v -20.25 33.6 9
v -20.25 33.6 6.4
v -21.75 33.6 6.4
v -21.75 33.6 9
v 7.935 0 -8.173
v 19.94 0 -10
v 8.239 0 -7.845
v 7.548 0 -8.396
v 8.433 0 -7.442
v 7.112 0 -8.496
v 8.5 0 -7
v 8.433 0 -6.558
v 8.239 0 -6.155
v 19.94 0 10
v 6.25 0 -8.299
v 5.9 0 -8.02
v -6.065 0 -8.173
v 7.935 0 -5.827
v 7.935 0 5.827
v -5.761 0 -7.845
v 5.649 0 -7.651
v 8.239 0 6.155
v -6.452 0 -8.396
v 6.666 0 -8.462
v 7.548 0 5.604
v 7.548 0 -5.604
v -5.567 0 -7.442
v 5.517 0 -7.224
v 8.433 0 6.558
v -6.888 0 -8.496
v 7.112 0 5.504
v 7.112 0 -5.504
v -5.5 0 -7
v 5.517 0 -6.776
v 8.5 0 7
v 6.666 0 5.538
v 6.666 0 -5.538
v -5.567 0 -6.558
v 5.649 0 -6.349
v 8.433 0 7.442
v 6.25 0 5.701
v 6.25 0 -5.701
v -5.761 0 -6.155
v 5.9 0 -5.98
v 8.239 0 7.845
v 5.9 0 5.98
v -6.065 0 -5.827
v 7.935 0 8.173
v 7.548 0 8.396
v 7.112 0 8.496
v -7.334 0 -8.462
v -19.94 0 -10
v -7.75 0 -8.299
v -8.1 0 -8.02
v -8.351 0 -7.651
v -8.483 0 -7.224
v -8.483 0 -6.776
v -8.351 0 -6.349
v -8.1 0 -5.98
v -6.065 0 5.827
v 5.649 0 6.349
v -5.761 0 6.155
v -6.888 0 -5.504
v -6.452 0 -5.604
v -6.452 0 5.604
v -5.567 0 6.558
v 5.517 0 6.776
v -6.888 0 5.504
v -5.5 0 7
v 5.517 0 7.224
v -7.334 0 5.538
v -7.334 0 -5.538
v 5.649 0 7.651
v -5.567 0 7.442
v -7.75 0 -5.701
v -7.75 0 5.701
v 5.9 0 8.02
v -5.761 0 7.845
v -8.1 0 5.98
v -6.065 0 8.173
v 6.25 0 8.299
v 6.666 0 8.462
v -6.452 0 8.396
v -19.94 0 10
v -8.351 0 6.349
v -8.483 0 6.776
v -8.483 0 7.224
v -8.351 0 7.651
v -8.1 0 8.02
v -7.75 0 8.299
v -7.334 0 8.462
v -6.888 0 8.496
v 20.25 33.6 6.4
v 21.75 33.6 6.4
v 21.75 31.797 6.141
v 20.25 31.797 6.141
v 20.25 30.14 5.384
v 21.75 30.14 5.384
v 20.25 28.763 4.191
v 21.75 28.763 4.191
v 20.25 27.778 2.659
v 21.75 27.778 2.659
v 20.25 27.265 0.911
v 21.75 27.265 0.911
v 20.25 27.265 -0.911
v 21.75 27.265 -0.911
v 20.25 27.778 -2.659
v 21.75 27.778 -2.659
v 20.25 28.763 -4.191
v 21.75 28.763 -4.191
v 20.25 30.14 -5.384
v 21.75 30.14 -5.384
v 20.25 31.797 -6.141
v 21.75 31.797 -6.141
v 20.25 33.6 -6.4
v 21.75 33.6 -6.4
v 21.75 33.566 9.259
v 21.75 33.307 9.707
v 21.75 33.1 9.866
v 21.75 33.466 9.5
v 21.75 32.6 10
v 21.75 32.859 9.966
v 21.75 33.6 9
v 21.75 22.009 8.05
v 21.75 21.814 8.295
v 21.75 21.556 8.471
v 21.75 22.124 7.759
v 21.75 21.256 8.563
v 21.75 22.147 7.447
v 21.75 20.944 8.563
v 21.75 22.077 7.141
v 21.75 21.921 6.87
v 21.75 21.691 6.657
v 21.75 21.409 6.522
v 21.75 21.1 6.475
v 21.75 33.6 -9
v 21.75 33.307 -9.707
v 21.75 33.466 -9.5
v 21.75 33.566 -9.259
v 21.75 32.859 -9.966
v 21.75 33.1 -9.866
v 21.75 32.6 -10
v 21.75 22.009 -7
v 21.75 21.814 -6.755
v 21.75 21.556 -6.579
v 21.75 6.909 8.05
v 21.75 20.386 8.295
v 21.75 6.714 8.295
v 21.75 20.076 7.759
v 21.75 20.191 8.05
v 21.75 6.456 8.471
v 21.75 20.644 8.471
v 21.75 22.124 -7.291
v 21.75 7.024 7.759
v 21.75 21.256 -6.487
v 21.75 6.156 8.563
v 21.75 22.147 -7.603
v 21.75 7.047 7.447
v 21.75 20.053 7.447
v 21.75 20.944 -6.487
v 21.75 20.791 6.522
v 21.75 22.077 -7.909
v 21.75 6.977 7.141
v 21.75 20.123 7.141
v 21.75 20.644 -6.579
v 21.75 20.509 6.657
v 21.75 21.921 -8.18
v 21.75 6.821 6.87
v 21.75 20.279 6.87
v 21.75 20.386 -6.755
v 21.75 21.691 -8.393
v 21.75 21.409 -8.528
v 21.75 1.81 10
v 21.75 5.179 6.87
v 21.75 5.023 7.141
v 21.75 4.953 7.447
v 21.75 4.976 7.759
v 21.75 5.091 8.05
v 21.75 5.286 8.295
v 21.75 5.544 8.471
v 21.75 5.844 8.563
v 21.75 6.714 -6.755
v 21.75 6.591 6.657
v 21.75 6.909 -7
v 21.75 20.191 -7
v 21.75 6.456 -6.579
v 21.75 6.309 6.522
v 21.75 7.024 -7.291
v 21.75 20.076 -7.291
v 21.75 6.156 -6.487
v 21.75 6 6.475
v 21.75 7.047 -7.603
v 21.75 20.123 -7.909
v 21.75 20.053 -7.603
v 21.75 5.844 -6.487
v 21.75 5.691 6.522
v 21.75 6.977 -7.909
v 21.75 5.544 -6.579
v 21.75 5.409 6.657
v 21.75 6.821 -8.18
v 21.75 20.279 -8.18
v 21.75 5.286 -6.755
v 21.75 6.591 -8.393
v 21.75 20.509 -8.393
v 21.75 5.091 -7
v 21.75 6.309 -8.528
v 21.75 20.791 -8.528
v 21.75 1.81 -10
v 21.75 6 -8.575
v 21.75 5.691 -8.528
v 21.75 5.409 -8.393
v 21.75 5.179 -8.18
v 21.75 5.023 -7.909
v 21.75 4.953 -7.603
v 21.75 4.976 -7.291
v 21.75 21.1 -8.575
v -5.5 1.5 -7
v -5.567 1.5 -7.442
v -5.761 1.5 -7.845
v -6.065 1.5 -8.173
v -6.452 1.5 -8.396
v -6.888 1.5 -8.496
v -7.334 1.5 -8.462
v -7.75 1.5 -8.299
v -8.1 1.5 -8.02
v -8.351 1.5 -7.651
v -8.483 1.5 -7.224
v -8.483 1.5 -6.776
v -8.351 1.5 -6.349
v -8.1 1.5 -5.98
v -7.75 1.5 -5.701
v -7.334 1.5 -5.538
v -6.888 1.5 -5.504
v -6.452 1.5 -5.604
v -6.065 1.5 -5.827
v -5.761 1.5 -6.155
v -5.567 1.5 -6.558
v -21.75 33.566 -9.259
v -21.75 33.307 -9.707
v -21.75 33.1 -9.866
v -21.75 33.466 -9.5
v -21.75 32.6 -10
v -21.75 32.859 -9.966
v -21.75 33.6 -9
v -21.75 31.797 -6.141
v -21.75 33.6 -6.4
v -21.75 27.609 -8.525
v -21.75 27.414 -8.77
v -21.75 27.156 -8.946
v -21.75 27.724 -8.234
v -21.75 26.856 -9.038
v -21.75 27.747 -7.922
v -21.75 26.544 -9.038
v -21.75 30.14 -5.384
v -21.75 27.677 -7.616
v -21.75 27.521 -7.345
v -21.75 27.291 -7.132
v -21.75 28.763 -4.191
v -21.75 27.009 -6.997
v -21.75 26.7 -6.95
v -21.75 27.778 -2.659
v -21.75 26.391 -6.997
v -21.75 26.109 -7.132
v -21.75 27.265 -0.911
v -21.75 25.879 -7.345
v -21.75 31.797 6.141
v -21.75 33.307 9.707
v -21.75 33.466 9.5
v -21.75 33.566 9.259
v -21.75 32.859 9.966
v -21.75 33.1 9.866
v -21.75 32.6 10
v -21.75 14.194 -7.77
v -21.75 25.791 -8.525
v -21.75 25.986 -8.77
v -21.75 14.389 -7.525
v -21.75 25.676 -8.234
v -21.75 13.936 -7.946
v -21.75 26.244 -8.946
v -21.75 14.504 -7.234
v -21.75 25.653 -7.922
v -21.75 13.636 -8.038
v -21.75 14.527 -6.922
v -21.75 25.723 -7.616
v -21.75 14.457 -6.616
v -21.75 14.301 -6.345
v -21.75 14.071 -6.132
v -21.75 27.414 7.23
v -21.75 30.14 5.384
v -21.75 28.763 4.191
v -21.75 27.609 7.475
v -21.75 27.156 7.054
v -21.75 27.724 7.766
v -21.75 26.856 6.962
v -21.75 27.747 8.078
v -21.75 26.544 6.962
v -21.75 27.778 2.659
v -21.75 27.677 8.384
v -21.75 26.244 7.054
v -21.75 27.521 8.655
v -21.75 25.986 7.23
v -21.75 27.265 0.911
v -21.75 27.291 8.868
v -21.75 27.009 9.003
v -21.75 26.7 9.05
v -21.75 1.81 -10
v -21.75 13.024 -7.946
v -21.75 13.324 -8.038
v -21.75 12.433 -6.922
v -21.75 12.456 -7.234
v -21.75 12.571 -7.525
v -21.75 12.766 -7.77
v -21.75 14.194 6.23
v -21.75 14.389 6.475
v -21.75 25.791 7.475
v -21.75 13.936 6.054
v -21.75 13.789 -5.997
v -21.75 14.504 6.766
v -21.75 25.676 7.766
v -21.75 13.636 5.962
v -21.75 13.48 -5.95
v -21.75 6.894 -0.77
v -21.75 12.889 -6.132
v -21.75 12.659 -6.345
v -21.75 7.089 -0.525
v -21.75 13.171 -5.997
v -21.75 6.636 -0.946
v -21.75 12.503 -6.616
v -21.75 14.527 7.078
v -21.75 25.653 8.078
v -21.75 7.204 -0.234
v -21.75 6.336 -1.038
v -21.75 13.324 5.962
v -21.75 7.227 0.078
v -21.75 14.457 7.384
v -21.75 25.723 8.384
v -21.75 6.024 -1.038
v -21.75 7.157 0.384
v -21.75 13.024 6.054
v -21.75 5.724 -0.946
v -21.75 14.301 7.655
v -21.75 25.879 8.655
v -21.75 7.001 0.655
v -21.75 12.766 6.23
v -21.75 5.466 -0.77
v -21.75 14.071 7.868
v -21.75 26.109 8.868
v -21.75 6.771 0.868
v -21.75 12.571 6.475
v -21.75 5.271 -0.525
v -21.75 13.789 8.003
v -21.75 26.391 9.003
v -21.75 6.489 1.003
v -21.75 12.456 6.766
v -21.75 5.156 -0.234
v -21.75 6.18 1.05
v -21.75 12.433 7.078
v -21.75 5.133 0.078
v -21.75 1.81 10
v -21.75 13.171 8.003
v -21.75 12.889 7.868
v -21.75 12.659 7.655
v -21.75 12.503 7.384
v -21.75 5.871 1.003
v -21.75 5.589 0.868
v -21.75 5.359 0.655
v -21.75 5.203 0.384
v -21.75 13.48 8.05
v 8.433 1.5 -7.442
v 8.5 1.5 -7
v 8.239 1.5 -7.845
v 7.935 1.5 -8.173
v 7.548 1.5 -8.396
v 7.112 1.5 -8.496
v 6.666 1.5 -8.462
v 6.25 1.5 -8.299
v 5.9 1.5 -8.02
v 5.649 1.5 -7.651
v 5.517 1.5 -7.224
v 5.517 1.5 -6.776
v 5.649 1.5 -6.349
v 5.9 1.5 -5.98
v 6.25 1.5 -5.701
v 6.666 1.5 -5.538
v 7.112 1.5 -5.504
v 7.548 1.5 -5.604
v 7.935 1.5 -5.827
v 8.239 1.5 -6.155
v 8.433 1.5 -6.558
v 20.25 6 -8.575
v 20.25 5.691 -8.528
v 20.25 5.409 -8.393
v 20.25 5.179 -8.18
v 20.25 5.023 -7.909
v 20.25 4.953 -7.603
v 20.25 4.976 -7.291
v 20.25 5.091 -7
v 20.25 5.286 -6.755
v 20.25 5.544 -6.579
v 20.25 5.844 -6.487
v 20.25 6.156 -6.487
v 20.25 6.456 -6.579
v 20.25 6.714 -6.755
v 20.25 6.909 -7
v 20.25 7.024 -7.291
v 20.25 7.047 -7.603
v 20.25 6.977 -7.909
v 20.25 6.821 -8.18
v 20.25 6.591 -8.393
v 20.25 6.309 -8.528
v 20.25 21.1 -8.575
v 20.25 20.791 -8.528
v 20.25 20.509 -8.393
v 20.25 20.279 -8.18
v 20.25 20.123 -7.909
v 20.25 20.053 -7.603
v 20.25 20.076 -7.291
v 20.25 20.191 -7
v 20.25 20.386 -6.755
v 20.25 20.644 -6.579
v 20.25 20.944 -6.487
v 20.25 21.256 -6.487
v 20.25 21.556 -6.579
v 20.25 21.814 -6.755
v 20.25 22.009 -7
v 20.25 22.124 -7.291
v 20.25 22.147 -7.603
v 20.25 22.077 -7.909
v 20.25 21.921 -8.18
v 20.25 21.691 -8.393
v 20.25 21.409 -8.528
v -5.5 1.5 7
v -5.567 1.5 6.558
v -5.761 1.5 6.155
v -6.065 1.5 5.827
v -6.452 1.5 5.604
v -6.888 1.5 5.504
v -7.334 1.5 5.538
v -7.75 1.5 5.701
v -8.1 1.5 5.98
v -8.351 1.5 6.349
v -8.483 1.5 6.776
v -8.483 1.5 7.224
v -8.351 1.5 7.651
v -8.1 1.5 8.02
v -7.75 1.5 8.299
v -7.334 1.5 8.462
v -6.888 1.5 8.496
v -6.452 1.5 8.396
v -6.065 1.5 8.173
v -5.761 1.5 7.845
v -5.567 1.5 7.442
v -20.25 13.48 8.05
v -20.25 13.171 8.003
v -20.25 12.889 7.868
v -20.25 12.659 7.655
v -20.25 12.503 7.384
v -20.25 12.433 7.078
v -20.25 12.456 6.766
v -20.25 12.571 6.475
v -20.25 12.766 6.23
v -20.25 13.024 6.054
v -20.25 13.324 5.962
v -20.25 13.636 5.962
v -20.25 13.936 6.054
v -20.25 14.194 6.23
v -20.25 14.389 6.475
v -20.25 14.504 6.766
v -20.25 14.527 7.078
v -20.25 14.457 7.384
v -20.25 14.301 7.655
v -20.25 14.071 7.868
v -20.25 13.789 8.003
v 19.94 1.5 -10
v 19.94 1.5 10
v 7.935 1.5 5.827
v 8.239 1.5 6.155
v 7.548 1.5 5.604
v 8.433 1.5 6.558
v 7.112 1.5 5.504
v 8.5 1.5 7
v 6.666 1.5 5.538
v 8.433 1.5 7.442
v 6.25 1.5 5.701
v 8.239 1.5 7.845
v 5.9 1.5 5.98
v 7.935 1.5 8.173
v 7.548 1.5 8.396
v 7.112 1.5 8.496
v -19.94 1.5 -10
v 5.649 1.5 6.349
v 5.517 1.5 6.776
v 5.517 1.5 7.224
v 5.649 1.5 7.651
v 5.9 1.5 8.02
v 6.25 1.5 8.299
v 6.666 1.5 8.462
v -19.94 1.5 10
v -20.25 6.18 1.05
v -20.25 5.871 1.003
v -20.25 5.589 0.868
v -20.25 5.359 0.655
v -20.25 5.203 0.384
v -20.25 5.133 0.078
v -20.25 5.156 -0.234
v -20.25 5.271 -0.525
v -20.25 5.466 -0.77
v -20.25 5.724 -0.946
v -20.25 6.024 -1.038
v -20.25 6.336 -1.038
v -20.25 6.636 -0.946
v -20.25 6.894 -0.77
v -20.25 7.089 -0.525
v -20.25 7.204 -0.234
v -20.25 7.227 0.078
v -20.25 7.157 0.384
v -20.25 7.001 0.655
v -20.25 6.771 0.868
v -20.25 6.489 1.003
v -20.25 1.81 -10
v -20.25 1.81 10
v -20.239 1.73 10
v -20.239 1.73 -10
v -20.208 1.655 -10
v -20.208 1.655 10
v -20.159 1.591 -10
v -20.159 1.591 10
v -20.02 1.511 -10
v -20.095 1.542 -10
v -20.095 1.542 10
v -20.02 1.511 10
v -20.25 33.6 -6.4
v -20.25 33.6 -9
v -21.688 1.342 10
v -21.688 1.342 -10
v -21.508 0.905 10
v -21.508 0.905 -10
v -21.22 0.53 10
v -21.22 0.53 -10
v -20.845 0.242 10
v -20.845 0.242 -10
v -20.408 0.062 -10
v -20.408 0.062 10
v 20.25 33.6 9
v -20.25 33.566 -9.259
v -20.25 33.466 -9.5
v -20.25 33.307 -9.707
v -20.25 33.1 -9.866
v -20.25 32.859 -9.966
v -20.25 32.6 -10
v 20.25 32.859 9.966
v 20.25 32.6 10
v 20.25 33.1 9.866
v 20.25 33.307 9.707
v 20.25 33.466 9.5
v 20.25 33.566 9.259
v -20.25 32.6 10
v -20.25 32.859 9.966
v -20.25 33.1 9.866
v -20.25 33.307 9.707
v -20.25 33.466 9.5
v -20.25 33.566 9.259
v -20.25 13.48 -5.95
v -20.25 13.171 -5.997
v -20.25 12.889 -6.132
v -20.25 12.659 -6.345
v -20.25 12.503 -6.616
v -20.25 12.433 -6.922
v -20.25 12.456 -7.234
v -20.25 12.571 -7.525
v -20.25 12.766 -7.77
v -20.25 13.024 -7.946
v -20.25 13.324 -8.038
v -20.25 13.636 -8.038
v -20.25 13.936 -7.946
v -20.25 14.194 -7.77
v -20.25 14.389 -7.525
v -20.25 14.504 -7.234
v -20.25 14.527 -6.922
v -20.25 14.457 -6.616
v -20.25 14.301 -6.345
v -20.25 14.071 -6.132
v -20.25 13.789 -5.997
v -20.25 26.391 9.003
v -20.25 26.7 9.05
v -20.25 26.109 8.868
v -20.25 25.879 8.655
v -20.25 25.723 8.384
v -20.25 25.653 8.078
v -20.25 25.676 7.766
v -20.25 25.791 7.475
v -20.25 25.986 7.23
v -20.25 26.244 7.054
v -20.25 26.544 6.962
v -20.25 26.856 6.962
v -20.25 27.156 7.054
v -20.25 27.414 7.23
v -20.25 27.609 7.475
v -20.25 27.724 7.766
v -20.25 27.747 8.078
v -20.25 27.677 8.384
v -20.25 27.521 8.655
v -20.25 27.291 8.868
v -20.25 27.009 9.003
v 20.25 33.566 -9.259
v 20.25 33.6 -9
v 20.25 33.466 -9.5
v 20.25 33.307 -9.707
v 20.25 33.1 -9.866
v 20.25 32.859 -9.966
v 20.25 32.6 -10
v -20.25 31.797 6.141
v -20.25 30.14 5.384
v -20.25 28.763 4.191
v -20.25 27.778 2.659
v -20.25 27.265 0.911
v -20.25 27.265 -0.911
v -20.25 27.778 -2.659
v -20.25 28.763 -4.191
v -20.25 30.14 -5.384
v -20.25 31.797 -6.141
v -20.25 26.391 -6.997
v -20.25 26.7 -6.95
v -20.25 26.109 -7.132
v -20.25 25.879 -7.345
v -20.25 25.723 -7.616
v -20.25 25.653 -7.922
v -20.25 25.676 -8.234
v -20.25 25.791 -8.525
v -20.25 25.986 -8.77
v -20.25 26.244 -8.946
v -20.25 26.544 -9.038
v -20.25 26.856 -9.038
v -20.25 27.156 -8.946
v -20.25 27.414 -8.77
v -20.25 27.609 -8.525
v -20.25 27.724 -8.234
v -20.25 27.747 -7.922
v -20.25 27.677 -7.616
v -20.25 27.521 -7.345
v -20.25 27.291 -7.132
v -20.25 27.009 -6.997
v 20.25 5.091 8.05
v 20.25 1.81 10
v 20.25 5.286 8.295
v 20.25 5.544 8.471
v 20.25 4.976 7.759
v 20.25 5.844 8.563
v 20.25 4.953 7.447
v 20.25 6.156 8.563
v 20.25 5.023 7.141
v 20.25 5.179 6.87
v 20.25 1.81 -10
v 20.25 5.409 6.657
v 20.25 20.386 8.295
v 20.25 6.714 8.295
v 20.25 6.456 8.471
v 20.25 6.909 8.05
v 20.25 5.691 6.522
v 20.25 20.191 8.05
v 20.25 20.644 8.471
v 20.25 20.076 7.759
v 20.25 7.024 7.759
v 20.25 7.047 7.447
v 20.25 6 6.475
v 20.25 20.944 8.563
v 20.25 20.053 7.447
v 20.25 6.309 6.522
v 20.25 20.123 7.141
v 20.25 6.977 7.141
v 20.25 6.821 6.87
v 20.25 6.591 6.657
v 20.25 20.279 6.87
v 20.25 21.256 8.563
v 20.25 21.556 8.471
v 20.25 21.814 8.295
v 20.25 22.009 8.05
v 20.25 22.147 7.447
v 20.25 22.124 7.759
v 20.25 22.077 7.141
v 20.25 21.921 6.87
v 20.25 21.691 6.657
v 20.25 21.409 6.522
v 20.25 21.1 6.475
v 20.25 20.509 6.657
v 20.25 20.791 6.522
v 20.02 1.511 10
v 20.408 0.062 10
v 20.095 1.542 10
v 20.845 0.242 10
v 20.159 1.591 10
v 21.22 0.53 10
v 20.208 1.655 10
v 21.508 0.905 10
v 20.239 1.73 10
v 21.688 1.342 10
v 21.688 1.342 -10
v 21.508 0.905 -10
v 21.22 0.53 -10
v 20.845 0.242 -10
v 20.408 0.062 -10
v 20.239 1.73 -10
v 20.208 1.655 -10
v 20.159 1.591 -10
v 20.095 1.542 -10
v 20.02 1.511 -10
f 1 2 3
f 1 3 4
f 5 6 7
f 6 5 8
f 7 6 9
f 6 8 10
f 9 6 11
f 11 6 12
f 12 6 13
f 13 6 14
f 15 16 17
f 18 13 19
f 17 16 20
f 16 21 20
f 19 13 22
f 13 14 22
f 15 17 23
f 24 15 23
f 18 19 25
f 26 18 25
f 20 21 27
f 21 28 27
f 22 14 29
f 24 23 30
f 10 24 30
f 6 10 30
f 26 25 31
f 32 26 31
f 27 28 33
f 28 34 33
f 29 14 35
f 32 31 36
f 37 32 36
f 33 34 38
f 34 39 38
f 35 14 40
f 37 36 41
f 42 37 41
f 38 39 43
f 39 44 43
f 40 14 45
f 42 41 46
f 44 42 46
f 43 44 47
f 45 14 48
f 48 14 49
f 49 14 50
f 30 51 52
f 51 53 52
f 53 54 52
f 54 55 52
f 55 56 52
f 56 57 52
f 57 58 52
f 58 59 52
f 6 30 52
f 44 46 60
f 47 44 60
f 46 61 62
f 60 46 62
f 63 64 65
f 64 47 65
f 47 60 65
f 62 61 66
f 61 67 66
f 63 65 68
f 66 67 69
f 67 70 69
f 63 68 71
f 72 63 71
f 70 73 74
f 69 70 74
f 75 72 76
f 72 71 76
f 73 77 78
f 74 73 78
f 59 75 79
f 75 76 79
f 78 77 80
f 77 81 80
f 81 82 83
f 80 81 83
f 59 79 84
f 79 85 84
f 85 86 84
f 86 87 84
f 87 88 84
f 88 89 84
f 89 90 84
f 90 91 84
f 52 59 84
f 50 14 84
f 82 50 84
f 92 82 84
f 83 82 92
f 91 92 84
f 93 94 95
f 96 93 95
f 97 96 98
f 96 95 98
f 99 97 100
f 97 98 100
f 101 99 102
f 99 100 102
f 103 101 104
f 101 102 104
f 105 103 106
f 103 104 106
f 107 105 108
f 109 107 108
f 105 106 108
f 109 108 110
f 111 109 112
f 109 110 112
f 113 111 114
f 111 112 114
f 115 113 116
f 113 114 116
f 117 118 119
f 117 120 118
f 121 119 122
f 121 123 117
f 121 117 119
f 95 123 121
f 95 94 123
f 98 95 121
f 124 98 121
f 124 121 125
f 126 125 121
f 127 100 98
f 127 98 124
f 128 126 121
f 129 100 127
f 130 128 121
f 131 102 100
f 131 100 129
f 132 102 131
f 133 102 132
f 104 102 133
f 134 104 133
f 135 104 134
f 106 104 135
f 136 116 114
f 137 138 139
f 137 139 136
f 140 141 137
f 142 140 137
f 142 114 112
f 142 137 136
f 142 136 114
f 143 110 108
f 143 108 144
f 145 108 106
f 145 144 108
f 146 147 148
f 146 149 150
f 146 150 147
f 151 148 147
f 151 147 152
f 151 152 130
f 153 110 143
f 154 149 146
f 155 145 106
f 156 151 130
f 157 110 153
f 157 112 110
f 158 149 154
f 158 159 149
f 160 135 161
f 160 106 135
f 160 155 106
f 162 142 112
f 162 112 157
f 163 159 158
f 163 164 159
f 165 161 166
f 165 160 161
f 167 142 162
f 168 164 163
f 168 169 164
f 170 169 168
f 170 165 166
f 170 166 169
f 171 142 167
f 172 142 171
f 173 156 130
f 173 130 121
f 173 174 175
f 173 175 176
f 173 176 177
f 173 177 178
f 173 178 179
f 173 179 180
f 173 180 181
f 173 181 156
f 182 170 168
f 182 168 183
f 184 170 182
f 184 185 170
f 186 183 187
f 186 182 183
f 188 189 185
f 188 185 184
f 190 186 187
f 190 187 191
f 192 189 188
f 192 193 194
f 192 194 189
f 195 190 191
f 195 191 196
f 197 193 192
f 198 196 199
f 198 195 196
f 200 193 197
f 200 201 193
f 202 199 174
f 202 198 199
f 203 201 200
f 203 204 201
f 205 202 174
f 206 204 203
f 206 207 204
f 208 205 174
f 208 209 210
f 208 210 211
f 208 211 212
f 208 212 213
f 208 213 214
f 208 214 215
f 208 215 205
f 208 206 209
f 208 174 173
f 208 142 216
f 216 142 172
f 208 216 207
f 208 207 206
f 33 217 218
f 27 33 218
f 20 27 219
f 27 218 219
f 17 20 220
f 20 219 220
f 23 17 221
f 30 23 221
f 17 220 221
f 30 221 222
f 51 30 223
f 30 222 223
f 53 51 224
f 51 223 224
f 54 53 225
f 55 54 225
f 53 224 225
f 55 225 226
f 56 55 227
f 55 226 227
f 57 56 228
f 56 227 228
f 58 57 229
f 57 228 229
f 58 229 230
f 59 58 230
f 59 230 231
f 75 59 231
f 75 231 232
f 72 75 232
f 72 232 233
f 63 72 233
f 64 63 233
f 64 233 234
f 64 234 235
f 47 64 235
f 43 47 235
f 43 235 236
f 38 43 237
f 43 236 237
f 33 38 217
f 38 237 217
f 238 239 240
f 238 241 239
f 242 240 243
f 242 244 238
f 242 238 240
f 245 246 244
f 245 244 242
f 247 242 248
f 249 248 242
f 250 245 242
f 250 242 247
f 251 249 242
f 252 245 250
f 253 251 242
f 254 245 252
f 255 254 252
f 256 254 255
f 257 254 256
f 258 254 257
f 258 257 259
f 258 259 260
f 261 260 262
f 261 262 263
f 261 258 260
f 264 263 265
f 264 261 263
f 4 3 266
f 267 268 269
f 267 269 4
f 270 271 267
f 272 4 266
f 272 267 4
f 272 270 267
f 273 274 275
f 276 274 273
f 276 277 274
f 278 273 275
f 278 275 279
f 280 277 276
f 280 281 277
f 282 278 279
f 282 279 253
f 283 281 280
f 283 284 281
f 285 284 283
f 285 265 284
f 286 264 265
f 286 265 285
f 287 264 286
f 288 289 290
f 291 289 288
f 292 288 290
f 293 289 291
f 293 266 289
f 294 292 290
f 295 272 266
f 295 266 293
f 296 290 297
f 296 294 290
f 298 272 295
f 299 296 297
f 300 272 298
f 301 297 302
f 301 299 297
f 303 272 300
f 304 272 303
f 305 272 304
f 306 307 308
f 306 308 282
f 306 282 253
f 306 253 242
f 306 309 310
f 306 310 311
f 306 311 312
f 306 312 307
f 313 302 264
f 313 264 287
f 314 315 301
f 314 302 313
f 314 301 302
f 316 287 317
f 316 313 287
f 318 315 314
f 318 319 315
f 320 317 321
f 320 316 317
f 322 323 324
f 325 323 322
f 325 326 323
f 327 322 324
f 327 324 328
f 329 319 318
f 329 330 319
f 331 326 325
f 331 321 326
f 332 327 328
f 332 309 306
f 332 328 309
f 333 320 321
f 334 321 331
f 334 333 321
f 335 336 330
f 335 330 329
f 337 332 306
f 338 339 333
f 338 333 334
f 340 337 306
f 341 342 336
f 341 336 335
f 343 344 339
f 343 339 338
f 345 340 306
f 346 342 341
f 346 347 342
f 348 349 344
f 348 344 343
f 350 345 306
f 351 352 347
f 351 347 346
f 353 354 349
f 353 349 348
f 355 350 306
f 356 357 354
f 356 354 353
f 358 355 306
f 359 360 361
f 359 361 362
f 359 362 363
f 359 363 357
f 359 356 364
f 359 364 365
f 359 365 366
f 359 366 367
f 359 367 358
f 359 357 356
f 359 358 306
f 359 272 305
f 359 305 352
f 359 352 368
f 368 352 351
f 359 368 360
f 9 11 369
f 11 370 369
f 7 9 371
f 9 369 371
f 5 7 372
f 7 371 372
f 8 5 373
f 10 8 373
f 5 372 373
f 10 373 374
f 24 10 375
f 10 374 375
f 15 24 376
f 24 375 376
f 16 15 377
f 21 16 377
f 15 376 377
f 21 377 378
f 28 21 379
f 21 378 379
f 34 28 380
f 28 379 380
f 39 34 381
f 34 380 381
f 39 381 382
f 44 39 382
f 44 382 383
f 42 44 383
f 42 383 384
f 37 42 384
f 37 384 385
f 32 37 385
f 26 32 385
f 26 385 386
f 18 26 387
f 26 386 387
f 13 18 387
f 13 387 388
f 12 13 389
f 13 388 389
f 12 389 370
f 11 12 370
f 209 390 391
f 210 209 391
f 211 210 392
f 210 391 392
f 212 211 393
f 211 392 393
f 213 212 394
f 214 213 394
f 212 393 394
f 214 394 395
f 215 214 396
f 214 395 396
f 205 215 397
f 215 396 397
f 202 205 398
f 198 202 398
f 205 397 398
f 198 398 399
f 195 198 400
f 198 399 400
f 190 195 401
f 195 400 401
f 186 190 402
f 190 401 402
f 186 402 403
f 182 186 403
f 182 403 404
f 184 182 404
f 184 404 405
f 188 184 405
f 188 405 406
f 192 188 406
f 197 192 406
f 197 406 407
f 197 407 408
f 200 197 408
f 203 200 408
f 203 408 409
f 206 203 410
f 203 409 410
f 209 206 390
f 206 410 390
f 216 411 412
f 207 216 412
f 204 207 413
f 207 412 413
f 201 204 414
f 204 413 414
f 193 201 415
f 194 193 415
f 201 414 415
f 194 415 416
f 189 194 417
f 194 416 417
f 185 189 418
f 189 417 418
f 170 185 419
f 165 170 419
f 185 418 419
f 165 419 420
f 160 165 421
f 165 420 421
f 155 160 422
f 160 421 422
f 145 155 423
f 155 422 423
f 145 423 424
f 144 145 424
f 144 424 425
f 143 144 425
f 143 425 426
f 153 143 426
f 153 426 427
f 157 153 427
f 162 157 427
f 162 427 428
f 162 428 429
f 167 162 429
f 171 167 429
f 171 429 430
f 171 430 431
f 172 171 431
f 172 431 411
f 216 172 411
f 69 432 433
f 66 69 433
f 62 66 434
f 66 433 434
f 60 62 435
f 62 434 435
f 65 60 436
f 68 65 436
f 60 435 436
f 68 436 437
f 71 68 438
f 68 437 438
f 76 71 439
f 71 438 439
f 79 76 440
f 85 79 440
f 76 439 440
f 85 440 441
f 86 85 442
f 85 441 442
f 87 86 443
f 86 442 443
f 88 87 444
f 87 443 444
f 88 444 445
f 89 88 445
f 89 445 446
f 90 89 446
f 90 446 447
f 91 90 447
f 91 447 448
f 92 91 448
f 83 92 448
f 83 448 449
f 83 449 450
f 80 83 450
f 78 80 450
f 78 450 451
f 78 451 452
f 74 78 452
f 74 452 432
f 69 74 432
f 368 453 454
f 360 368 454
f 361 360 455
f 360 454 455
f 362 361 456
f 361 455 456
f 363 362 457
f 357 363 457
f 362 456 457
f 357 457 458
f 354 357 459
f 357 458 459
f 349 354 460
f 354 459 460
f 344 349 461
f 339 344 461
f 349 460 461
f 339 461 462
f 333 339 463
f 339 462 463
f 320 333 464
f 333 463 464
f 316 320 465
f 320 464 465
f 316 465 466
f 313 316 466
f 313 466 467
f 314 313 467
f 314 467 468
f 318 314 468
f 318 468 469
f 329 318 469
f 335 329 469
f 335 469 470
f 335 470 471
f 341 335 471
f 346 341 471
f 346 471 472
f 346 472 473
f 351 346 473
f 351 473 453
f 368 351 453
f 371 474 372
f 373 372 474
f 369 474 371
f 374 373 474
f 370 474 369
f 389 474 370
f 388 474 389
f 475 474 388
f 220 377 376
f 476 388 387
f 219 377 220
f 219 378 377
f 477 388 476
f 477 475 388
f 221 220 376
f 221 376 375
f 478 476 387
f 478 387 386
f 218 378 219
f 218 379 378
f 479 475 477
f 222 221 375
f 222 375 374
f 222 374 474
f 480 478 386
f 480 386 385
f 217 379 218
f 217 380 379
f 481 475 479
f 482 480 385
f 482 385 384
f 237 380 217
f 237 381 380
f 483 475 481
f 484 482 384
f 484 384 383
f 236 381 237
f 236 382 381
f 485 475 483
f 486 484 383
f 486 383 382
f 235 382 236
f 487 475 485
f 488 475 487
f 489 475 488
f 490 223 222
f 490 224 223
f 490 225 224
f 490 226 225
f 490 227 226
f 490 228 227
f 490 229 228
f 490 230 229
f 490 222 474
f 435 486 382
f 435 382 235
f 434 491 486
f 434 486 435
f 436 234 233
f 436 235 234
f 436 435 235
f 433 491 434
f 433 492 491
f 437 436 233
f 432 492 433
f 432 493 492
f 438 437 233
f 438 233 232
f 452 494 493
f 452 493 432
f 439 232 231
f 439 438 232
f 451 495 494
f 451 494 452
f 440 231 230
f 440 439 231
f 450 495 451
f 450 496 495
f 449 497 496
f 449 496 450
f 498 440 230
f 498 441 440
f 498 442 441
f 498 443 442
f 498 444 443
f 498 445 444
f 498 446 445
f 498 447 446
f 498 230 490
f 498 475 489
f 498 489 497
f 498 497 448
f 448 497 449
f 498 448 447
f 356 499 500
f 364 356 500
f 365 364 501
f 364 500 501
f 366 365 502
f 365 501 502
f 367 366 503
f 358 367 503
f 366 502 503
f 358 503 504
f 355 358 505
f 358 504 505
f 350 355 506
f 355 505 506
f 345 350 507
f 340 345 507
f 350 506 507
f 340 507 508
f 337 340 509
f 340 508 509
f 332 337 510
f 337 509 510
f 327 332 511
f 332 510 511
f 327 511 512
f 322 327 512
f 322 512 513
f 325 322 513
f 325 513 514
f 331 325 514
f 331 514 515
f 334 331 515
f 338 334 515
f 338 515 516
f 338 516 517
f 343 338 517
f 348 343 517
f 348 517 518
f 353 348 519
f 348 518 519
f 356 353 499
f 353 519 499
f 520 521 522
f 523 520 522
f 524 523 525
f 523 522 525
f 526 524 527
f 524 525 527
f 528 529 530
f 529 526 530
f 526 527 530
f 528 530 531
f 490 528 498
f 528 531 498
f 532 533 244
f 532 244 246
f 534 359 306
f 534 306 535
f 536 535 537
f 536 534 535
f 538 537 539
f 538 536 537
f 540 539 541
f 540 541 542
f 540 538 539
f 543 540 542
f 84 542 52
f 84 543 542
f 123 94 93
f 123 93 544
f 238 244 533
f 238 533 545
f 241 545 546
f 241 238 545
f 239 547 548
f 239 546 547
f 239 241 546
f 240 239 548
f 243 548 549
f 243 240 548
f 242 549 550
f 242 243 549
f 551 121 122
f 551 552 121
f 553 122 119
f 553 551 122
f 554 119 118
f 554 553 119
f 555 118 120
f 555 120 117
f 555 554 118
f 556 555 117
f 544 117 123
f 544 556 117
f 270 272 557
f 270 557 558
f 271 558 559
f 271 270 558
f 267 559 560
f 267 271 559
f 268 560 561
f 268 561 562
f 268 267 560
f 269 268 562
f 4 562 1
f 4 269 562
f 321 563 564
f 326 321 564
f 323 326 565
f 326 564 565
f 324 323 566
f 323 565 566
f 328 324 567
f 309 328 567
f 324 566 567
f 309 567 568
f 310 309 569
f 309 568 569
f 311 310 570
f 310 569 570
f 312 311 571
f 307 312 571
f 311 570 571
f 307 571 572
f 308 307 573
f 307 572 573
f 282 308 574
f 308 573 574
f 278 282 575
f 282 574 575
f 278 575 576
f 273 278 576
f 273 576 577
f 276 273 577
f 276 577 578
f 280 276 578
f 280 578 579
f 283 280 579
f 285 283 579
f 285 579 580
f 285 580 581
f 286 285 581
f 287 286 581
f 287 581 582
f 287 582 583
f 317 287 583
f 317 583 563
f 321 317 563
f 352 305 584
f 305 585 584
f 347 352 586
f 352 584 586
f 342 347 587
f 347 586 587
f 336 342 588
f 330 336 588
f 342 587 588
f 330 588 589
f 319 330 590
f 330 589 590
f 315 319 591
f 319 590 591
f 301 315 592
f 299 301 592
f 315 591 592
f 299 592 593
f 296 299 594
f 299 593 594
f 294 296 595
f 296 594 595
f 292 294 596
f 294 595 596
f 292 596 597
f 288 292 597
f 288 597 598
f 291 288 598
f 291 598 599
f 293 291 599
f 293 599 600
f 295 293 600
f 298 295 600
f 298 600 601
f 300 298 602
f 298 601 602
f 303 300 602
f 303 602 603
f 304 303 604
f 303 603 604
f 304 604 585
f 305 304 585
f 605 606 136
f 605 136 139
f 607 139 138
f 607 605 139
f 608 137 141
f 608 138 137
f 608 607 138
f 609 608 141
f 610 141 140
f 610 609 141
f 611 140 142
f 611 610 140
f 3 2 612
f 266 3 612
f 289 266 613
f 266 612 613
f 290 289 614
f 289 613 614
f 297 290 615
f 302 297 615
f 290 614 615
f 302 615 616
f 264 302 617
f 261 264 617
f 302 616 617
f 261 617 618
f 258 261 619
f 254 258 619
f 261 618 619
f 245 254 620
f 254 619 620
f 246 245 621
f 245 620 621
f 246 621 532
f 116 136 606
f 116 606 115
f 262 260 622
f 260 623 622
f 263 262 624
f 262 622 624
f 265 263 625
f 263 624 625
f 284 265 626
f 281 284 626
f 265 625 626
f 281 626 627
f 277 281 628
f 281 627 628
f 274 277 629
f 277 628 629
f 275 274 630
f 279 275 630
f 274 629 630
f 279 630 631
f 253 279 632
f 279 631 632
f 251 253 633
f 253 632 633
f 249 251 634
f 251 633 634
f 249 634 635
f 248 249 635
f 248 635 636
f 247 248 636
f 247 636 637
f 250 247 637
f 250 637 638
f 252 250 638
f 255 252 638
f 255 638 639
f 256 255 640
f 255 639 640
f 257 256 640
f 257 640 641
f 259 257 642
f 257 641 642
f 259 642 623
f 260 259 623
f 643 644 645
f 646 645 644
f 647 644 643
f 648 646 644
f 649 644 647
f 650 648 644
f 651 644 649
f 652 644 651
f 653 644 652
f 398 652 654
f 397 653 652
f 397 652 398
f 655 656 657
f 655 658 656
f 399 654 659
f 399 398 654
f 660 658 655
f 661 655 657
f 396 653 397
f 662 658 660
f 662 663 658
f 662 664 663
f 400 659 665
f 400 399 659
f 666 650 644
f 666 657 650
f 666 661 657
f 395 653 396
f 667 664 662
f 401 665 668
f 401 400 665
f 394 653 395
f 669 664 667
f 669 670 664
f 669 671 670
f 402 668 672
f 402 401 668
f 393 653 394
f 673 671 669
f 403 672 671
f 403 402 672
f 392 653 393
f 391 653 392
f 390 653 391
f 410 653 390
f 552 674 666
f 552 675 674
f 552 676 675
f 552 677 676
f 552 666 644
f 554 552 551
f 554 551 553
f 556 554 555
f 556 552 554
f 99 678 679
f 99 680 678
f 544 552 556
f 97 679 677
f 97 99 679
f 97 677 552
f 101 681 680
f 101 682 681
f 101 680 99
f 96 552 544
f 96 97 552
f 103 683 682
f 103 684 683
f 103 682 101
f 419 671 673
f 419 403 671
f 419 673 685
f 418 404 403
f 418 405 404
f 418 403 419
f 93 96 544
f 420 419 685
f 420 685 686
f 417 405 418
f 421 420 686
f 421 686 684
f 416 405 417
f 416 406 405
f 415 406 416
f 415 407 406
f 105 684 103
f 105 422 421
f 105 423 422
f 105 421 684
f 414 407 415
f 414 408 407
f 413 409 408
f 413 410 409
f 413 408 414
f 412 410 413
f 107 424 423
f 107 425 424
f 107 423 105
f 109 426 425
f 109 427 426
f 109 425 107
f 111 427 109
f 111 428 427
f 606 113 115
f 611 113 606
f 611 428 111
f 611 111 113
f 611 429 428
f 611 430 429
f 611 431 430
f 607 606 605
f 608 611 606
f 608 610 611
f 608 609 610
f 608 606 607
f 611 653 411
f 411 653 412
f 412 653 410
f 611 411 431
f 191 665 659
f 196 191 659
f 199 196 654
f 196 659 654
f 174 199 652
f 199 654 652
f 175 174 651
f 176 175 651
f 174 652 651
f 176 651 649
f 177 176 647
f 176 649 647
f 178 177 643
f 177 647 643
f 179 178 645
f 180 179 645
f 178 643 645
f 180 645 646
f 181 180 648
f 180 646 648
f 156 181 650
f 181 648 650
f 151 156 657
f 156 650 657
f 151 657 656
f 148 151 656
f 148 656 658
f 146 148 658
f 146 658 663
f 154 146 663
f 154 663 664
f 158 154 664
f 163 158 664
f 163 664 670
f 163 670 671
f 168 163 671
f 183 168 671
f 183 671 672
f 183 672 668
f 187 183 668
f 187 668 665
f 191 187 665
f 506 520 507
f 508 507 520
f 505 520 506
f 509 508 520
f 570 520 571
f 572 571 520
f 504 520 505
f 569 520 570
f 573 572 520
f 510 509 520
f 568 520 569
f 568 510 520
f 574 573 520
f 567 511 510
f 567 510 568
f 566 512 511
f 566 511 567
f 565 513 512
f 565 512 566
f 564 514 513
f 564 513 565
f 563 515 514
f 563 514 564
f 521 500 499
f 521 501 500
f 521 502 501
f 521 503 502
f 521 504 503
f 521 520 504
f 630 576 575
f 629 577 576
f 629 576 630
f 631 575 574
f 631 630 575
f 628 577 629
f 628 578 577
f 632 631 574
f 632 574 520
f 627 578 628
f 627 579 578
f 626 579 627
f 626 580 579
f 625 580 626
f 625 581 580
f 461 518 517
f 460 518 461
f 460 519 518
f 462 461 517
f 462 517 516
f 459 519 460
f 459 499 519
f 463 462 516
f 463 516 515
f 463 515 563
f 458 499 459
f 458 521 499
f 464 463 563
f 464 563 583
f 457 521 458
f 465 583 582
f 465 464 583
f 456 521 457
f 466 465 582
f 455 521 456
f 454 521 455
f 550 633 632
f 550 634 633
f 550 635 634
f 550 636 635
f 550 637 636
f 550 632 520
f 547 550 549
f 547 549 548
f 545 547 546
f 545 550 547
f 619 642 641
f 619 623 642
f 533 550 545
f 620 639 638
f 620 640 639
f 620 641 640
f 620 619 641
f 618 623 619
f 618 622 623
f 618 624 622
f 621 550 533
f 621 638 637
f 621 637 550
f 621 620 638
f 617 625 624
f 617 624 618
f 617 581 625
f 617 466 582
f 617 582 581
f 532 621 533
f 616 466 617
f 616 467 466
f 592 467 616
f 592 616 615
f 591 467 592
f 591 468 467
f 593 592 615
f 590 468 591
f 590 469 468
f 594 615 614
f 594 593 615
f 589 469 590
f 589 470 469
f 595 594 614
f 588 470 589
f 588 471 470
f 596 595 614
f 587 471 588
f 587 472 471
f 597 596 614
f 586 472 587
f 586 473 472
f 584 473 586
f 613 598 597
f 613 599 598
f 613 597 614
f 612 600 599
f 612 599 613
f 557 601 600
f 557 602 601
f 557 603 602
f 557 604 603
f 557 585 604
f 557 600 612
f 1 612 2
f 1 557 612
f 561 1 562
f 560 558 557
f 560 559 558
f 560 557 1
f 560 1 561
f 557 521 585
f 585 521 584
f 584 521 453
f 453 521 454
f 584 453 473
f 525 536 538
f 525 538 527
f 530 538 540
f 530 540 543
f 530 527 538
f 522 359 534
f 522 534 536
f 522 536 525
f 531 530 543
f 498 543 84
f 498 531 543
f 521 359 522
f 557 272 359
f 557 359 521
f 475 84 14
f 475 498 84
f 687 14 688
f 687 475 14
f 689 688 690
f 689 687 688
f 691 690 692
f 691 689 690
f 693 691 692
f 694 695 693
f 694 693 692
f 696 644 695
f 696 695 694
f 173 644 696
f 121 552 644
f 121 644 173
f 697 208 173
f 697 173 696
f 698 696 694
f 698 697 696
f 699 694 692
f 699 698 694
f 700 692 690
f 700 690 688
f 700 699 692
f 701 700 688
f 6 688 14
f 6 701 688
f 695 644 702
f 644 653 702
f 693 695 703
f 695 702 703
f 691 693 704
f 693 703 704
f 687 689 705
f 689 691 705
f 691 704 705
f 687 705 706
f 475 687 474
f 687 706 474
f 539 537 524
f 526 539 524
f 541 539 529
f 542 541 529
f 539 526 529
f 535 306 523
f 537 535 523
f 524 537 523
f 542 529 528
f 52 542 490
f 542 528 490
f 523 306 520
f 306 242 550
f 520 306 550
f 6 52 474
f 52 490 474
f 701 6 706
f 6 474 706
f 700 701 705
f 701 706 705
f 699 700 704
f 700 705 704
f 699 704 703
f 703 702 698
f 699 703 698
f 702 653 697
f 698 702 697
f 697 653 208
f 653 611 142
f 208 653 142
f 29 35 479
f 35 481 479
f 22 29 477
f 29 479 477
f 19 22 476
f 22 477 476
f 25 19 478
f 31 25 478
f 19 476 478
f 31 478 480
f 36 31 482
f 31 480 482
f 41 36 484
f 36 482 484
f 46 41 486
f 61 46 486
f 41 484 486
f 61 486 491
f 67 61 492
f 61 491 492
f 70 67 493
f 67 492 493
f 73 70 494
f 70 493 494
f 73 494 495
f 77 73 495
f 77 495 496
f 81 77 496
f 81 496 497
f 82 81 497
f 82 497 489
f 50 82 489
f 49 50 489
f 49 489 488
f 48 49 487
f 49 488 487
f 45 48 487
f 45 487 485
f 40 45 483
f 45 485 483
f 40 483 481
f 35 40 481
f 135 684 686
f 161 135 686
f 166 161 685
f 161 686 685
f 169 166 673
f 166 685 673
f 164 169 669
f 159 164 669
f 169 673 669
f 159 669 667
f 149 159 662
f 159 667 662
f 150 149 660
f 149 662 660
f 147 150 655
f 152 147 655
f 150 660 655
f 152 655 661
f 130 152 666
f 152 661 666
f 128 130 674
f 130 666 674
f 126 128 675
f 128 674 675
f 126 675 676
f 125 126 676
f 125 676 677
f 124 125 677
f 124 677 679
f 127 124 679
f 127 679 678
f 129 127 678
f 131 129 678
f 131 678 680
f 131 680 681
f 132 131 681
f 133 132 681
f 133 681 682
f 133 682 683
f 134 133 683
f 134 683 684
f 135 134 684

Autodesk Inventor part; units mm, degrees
ref_plane "YZ Plane" through (0, 0, 0) normal (1, 0, 0) x (0, 1, 0)
ref_plane "XZ Plane" through (0, 0, 0) normal (0, 1, 0) x (-1, 0, 0)
ref_plane "XY Plane" through (0, 0, 0) normal (0, 0, 1) x (1, 0, 0)
sketch "Sketch1" plane through (0, 0, 0) normal (0, 1, 0) x (-1, 0, 0)
  line L0 (20.25, -10) -> (-20.25, -10)
  line L1 (-20.25, -10) -> (-20.25, 10)
  line L2 (-20.25, 10) -> (20.25, 10)
  line L3 (20.25, 10) -> (20.25, -10)
  point P0 (0, 0)
  dimension "d0" = 40.5
  dimension "d1" = 20
  dimension "d2" = 10
  dimension "d3" = 20.25
extrude "Plate1" add sketch "Sketch1" along normal blind 1.5
sketch "Sketch2" plane through (21.75, 0, -10) normal (-1, 0, 0) x (0, -1, 0)
  line L0 (0, 20) -> (0, 0)
  line L1 (0, 0) -> (-43.5, 0)
  line L2 (-43.5, 0) -> (-43.5, 20)
  line L3 (-43.5, 20) -> (0, 20)
edge flange "Flange1" height 43.5 angle 90 thickness 1.5 bend radius 0.31 thickness toward (-1, 0, 0) relief tear relief width 1.5 relief depth 0.75 edges at (20.25, 1.5, 0) wall of the first edge with corners at (21.75, 0, 10) (21.75, 0, -10) (21.75, 43.5, -10) (21.75, 43.5, 10)
bend "Bend1"
corner "Corner1"
sketch "Sketch3" plane through (-21.75, 0, 10) normal (1, 0, 0) x (0, 1, 0)
  line L0 (0, -20) -> (0, 0)
  line L1 (0, 0) -> (43.5, 0)
  line L2 (43.5, 0) -> (43.5, -20)
  line L3 (43.5, -20) -> (0, -20)
edge flange "Flange2" height 43.5 angle 90 thickness 1.5 bend radius 0.31 thickness toward (1, 0, 0) relief tear relief width 1.5 relief depth 0.75 edges at (-20.25, 1.5, 0) wall of the first edge with corners at (-21.75, 0, -10) (-21.75, 0, 10) (-21.75, 43.5, 10) (-21.75, 43.5, -10)
bend "Bend2"
corner "Corner2"
sketch "Sketch4" plane through (21.75, 43.5, 10) normal (1, 0, 0) x (0, 0, -1)
  circle A0 centre (10, -9.9) radius 6.4
  line L0 (0, 0) -> (20, 0) projected
  line L1 (20, 0) -> (20, -41.69) projected
  point P0 (10, -43.5)
  dimension "d25" = 9.9
  dimension "d26" = 12.8
  dimension "d27" = 10
extrude "Extrusion1" cut sketch "Sketch4" against normal blind 50
sketch "Sketch5" plane through (21.75, 43.5, 10) normal (1, 0, 0) x (0, 0, -1)
  circle A0 centre (10, -9.9) radius 6.4 projected
  line L0 (0, 0) -> (20, 0) projected
  line L1 (-4, 0) -> (24, 0)
  line L2 (24, 0) -> (24, -9.9)
  line L3 (24, -9.9) -> (-4, -9.9)
  line L4 (-4, -9.9) -> (-4, 0)
  line L5 (0, -41.69) -> (0, 0) projected
  point P0 (10, -43.5)
  point P1 (20, 0)
  dimension "d30" = 9.9
  dimension "d31" = 28
  dimension "d32" = 4
extrude "Extrusion2" cut sketch "Sketch5" against normal blind 50 contours L3 A0 | A0 L3 L5 L0 L1 L2 | L3 L4 L1 L5 picked at (9.2435, -7.9053)
fillet "Fillet1" radius 1 4 edges at (-21, 33.6, 10) (-21, 33.6, -10) (21, 33.6, -10) (21, 33.6, 10)
sketch "Sketch11" plane through (0, 1.5, 0) normal (0, 1, 0) x (1, 0, 0)
  circle A0 centre (7, 7) radius 1.5
  line L0 (-19.94, 10) -> (19.94, 10) projected
  line L1 (-19.94, 10) -> (-19.94, -10) projected
  circle A1 centre (-7, 7) radius 1.5
  circle A2 centre (7, -7) radius 1.5
  circle A3 centre (-7, -7) radius 1.5
  point P0 (0, 0)
  dimension "d71" = 7
  dimension "d72" = 3
  dimension "d73" = 7
  dimension "d76" = 14
  dimension "d79" = 14
extrude "Extrusion3" cut sketch "Sketch11" against normal through all
sketch "Sketch12" plane through (-21.75, 1.81, -10) normal (-1, 0, 0) x (0, 0, 1)
  circle A0 centre (18, 24.89) radius 0.7835
  circle A1 centre (10, 24.79) radius 0.7835
  circle A2 centre (17, 11.67) radius 0.7835
  circle A3 centre (3, 11.67) radius 0.7835
  circle A4 centre (10, 4.37) radius 0.7835
  circle A5 centre (2, 24.89) radius 0.7835
  point P0 (10, -1.81)
hole "Hole6" at (-21.75, 26.7, -8) at (-21.75, 26.7, 8) at (-21.75, 13.48, 7) at (-21.75, 6.18, 0) at (-21.75, 13.48, -7) direction (1, 0, 0) diameter 2.1 depth 1.5
sketch "Sketch13" plane through (21.75, 1.81, 10) normal (1, 0, 0) x (0, 0, -1)
  circle A0 centre (17.525, 4.19) radius 0.7835
  circle A1 centre (2.475, 4.19) radius 0.7835
  circle A2 centre (2.475, 19.29) radius 0.7835
  circle A3 centre (17.525, 19.29) radius 0.7835
  point P0 (10, -1.81)
hole "Hole7" at (21.75, 21.1, 7.525) at (21.75, 21.1, -7.525) at (21.75, 6, -7.525) at (21.75, 6, 7.525) direction (-1, 0, 0) diameter 2.1 depth 1.5
equation "\"d89\" = Thickness"
equation "\"d96\" = Thickness"
equation "\"d4\" = Thickness"
equation "\"d5\" = BendReliefWidth"
equation "\"d6\" = BendReliefDepth"
equation "\"d7\" = MinimumRemnant"
equation "\"d8\" = TransitionRadius"
equation "\"d11\" = BendRadius"
equation "\"d12\" = CornerReliefSize"
equation "\"d13\" = GapSize"
equation "\"d14\" = JacobiRadiusSize"
equation "\"d15\" = BendReliefWidth"
equation "\"d16\" = BendReliefDepth"
equation "\"d17\" = MinimumRemnant"
equation "\"d18\" = TransitionRadius"
equation "\"d21\" = BendRadius"
equation "\"d22\" = CornerReliefSize"
equation "\"d23\" = GapSize"
equation "\"d24\" = JacobiRadiusSize"
equation "\"BendReliefWidth\" = Thickness"
equation "\"BendReliefDepth\" = 0.5 * Thickness"
equation "\"CornerReliefSize\" = 4 * Thickness"
equation "\"MinimumRemnant\" = 2 * Thickness"
equation "\"TransitionRadius\" = BendRadius"
equation "\"JacobiRadiusSize\" = BendRadius"
equation "\"GapSize\" = Thickness"
equation "\"Thickness\" = 1.5"
equation "\"BendRadius\" = 0.31"
properties part number "axis_10_top_frame" material "Aluminum 6061-AHC"
